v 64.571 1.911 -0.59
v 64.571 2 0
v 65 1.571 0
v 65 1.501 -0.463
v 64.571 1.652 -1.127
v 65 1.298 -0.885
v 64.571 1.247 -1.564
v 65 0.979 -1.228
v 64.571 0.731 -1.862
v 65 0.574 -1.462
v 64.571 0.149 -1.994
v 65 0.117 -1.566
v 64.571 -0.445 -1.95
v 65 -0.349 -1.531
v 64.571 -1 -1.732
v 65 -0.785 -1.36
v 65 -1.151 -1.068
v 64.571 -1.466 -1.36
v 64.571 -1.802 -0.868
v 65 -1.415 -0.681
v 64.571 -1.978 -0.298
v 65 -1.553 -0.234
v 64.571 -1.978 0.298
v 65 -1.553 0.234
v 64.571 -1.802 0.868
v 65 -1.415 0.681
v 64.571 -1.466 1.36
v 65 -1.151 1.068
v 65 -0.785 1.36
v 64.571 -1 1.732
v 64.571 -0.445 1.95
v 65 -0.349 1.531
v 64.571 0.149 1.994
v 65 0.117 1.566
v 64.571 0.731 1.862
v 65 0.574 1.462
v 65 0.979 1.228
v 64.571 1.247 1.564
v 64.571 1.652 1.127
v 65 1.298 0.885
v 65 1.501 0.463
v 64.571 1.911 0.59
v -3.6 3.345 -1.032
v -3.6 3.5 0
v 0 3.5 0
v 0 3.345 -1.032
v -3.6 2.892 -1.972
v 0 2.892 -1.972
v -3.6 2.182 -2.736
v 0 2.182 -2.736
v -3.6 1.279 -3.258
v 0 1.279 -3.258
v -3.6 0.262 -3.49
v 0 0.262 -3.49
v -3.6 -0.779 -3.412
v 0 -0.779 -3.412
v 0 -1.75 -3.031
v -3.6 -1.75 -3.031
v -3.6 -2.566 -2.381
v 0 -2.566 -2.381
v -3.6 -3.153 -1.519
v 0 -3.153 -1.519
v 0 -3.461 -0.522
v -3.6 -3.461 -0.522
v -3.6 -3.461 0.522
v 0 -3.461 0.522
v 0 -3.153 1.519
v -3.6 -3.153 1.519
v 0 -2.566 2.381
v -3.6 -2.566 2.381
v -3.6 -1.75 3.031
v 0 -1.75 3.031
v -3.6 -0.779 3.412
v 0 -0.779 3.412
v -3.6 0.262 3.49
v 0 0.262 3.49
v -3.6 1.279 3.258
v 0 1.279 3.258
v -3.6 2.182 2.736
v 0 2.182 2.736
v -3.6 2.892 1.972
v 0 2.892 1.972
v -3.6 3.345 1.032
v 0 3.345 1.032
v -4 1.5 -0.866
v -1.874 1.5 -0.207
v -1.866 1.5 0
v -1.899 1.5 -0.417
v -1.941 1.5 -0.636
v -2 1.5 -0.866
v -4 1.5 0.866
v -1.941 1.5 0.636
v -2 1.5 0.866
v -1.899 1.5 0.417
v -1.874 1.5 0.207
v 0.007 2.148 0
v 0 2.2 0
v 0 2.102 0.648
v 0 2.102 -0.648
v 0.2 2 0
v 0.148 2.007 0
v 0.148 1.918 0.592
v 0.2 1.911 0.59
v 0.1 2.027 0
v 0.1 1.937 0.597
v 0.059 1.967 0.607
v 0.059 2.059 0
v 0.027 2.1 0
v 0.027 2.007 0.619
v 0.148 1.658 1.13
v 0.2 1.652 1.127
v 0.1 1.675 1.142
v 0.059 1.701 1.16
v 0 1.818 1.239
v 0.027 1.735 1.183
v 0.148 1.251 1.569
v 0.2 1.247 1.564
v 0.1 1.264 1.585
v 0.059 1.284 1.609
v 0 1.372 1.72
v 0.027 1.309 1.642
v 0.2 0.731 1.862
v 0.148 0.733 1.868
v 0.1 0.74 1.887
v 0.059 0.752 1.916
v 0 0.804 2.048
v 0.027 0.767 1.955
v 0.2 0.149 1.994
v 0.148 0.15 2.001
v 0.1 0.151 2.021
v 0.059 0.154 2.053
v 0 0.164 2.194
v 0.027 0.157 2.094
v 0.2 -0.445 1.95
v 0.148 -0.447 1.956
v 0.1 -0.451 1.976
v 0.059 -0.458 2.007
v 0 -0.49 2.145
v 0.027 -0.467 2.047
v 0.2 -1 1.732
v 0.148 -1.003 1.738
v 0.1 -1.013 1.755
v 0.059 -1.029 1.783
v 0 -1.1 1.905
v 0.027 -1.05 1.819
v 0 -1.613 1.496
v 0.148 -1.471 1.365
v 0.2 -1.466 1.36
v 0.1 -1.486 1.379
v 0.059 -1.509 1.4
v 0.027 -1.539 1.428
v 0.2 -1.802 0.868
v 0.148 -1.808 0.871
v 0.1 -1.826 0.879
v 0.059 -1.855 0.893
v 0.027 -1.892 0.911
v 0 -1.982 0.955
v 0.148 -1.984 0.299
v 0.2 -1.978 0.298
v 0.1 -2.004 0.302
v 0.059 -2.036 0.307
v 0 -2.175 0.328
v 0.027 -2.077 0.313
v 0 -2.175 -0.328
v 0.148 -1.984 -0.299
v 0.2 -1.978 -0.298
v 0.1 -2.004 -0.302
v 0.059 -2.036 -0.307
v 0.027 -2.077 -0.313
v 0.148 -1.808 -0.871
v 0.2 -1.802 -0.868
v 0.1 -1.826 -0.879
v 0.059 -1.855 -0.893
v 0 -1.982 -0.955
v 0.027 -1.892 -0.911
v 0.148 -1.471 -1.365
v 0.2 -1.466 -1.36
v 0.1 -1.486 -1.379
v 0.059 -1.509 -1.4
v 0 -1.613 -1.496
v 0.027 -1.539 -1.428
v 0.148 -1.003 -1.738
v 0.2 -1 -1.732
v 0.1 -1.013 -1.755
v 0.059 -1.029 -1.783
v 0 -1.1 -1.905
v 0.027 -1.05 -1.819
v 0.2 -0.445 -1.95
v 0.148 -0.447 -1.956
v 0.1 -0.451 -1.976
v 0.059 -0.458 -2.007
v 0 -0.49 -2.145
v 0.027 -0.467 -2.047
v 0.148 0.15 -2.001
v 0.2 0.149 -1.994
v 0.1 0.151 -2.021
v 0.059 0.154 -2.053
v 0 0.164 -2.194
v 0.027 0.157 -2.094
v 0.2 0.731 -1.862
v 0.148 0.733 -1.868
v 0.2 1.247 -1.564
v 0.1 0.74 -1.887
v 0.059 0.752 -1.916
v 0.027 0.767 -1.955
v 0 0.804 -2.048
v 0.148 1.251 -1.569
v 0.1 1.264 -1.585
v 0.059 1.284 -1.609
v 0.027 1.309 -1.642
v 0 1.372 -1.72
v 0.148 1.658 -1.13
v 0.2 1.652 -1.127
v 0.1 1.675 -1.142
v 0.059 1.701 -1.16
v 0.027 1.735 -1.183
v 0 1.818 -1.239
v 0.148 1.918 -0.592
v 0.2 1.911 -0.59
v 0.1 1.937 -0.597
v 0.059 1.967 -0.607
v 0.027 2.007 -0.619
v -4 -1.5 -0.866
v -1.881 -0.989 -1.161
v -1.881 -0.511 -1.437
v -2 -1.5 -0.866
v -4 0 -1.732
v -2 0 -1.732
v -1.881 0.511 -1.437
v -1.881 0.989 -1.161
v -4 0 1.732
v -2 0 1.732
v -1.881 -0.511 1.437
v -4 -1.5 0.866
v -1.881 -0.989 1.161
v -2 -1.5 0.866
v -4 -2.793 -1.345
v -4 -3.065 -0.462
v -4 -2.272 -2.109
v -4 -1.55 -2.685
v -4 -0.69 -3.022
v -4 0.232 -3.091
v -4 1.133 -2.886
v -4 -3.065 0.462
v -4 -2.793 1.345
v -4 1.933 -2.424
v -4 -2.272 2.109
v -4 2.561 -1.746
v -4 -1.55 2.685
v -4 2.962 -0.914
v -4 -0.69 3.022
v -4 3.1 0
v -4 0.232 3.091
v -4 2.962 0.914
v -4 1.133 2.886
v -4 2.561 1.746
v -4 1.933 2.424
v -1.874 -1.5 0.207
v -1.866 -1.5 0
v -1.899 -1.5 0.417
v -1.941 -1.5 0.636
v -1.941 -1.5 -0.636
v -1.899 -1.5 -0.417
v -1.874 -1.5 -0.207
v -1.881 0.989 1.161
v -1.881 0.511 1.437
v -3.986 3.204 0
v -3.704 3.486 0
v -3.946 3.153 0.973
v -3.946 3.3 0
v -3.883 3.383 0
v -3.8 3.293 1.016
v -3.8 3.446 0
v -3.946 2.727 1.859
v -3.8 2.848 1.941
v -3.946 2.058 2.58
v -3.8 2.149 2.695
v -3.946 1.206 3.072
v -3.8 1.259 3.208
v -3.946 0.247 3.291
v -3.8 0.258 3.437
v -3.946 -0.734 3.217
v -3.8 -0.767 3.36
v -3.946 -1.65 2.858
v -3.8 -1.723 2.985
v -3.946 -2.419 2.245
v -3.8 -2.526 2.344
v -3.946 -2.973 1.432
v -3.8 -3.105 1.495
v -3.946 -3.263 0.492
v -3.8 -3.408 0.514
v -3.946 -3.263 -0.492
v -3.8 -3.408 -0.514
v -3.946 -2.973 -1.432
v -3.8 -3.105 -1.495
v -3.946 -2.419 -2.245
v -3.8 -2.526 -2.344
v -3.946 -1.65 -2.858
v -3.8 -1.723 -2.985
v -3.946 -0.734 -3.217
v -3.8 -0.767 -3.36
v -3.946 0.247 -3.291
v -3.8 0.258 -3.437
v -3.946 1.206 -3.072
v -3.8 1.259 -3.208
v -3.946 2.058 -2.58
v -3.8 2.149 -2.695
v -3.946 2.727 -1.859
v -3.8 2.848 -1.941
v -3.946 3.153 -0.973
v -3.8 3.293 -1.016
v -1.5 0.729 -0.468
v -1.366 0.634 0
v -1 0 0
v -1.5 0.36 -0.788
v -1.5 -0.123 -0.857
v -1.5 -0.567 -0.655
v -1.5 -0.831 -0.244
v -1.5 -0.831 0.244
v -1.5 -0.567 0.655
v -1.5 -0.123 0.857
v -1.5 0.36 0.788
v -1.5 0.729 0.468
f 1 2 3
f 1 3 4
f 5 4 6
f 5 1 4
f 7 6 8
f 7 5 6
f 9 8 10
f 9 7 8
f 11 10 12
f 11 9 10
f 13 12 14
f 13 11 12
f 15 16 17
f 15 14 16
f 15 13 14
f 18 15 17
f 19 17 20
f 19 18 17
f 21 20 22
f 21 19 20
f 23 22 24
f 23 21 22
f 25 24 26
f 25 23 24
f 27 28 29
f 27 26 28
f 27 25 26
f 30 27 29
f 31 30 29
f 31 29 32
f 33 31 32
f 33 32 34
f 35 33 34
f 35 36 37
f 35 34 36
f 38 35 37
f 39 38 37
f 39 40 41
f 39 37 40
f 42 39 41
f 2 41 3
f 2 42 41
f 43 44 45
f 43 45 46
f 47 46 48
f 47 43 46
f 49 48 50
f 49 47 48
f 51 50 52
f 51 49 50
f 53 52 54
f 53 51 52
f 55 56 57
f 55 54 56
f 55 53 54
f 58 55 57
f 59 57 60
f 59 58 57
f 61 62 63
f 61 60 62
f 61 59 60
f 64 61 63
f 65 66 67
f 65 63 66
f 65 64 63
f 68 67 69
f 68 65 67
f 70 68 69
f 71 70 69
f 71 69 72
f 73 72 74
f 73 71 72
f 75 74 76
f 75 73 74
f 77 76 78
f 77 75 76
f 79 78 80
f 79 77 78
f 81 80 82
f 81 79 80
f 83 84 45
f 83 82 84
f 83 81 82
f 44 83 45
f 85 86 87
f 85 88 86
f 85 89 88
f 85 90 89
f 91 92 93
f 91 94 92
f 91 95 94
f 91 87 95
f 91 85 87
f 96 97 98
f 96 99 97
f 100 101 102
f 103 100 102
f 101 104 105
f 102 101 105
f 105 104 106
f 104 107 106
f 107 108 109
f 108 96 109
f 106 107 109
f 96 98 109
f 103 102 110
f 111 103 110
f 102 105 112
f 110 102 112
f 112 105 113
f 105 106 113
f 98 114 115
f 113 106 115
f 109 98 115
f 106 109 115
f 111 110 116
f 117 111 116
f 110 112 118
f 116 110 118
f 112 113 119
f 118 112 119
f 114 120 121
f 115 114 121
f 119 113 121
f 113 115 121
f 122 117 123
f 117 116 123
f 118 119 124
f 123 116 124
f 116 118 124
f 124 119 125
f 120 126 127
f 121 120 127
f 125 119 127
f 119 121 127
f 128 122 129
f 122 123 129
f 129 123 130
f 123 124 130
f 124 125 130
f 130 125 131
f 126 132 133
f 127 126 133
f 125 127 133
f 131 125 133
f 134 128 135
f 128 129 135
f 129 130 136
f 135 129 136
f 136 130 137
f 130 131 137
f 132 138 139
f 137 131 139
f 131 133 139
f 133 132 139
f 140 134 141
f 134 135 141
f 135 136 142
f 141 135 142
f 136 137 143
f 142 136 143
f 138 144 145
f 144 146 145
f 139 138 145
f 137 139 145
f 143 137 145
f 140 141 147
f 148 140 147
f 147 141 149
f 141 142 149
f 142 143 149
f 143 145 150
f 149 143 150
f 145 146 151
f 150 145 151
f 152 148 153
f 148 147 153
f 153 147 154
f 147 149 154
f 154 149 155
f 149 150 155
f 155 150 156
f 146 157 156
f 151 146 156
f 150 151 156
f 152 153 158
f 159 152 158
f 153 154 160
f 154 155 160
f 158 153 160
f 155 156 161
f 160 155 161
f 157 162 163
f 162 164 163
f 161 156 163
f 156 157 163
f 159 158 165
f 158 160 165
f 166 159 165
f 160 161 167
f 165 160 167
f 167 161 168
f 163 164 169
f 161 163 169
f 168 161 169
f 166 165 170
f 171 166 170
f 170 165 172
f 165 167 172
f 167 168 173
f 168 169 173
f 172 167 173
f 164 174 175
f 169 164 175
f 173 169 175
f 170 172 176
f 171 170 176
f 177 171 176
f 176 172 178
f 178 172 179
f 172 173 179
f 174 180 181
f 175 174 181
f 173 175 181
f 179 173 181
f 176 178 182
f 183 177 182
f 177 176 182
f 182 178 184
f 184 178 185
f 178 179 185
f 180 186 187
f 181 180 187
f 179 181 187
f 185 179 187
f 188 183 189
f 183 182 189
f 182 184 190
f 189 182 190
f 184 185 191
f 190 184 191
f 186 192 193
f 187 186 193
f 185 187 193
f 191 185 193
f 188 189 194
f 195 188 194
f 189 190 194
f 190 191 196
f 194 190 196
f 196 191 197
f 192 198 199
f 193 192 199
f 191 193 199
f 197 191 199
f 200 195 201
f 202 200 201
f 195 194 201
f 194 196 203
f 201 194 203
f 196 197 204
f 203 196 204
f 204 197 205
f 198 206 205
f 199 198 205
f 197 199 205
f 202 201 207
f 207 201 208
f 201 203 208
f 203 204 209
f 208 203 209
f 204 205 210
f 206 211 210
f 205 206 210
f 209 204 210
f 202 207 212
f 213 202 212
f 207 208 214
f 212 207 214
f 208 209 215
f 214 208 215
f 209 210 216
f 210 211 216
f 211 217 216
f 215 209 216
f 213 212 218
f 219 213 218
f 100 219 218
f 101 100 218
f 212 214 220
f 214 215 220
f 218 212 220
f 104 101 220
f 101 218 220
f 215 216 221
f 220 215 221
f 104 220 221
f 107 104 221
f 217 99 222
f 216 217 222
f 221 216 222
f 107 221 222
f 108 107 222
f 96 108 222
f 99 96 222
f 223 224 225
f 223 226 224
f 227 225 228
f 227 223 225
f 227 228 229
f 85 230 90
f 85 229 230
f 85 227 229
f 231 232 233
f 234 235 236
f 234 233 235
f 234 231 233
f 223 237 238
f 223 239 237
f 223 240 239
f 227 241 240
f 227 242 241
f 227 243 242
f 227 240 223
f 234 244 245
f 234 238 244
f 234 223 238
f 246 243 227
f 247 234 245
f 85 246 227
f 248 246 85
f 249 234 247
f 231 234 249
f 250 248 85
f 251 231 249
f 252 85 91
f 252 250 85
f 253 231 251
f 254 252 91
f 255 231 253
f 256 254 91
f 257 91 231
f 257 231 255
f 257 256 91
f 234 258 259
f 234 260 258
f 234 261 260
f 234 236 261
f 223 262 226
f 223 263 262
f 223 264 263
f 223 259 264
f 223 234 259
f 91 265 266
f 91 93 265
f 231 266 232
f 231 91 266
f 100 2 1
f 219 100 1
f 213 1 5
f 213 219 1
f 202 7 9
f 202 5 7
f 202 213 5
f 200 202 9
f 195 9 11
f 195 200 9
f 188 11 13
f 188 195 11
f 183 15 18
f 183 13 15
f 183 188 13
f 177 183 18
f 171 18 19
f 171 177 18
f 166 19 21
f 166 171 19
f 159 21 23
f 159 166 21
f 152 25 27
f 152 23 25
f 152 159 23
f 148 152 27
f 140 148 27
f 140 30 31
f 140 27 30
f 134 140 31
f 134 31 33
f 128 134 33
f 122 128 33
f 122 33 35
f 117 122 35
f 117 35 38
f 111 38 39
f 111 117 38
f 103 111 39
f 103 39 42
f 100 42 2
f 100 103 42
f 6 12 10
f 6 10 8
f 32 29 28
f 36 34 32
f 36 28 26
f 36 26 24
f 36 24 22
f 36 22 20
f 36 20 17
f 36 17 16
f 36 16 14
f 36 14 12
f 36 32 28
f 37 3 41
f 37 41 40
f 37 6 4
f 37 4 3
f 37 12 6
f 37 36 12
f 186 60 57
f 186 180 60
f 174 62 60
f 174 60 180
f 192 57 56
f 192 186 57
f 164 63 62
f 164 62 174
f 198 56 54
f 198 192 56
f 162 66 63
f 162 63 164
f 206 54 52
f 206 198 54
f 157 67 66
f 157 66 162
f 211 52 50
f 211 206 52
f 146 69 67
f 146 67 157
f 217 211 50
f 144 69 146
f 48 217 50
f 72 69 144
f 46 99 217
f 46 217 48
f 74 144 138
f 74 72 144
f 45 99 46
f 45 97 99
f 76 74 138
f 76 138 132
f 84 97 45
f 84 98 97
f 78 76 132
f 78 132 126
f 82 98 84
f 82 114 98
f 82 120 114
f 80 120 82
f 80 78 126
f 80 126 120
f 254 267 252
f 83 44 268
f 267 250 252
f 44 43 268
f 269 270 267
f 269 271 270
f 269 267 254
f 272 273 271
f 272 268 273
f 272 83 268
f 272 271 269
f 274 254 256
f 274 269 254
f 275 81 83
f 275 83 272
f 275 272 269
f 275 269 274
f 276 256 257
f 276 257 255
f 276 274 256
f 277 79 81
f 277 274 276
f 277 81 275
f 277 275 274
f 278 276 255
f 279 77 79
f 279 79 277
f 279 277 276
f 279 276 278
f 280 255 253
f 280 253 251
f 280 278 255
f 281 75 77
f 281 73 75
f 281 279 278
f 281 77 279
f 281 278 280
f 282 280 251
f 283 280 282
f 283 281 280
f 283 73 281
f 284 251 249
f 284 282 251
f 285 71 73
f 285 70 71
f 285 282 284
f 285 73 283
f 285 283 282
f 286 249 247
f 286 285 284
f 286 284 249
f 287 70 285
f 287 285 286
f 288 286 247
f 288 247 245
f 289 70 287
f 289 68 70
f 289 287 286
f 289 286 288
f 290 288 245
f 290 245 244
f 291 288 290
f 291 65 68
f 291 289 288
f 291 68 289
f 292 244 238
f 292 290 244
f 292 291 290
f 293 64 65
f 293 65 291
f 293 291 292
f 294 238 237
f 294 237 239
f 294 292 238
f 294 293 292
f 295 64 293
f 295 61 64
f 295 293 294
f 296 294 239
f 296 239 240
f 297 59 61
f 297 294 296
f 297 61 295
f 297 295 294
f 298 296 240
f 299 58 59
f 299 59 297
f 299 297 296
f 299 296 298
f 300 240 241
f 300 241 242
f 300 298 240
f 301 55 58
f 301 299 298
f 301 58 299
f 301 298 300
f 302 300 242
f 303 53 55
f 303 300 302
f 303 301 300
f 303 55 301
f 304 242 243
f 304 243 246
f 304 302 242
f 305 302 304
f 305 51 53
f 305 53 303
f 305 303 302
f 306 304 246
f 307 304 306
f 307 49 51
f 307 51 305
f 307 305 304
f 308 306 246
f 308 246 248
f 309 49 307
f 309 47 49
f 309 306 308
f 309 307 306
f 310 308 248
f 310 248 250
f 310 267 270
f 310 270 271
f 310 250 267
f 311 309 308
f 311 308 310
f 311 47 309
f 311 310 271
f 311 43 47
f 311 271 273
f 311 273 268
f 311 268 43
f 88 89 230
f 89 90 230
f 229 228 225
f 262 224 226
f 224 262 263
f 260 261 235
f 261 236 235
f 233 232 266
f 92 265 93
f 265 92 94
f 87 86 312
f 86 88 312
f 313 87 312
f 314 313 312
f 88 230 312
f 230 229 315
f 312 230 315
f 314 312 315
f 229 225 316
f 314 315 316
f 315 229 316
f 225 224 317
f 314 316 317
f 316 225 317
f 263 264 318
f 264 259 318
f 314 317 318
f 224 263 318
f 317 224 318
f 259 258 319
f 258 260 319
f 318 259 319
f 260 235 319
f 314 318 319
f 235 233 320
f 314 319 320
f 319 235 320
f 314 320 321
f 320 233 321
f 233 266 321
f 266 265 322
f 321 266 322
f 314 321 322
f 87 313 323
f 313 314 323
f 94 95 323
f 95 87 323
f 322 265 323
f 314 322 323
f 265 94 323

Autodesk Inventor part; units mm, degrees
ref_plane "YZ Plane" through (0, 0, 0) normal (1, 0, 0) x (0, 1, 0)
ref_plane "XZ Plane" through (0, 0, 0) normal (0, 1, 0) x (-1, 0, 0)
sketch "Sketch1" plane through (0, 0, 0) normal (0, 0, 1) x (1, 0, 0)
  line L0 (-1, 0) -> (65, 0)
  line L1 (65, 0) -> (65, 2)
  line L2 (65, 2) -> (45, 2)
  line L3 (45, 2) -> (44.5706, 2)
  line L4 (44.5706, 2) -> (0, 2)
  line L5 (0, 2) -> (0, 3.5)
  line L6 (0, 3.5) -> (-4, 3.5)
  line L7 (-4, 3.5) -> (-4, 1.7321)
  line L8 (-4, 1.7321) -> (-2, 1.7321)
  line L9 (-2, 1.7321) -> (-1, 0)
  line L10 (-17.8, 0) -> (78.8, 0) projected
  line L11 (0, -0.7) -> (0, 4.2) projected
  line L12 (45, 2) -> (0, 2) construction
  dimension "d0" = 20
  dimension "d1" = 0.4294
  dimension "d2" = 4
  dimension "d3" = 2
  dimension "d4" = 60
  dimension "d5" = 4
  dimension "d6" = 4
  dimension "d7" = 3.4641
  dimension "d8" = 7
  dimension "d19" = 65
revolve "Body" add sketch "Sketch1" angle 360 about axis through (-1, 0, 0) along (1, 0, 0)
sketch "Sketch2" plane through (-4, 0, 0) normal (-1, 0, 0) x (0, 0, 1)
  circle A0 centre (0, 0) radius 1.7321 projected
  line L0 (0, -4.9) -> (0, 4.9) projected
  line L1 (-4.9, 0) -> (4.9, 0) projected
  line L2 (1.7321, 0) -> (0.866, -1.5)
  line L3 (0.866, -1.5) -> (-0.866, -1.5)
  line L4 (-0.866, -1.5) -> (-1.7321, 0)
  line L5 (-1.7321, 0) -> (-0.866, 1.5)
  line L6 (-0.866, 1.5) -> (0.866, 1.5)
  line L7 (0.866, 1.5) -> (1.7321, 0)
extrude "Slot" add sketch "Sketch2" against normal up to next contours L7 A0 | A0 L2 | L6 L0 A0 | A0 L0 L3 | L0 L6 A0 | A0 L3 L0 | L4 A0 | A0 L5
fillet "Fillet2" radius 0.4 1 edges at (-4, -3.5, 0)
thread "Thread" size "M4x0.7" class "6g" standard "ISO Metric profile" length 20
chamfer "Chamfer1" distance 0.4294 distance2 0.4294 1 edges at (65, -2, 0) measured on face at (65, -0.527, -0.8312)
fillet "Fillet1" radius 0.2 1 edges at (0, -2, 0)
ref_plane "Work Plane1" through (30, 0, 0) normal (0, -0.5, 0.866) x (1, 0, 0)
equation "\"d0\" = GEL"
equation "\"d1\" = GAL"
equation "\"d2\" = KOH"
equation "\"d3\" = INTI"
equation "\"d5\" = GD"
equation "\"d6\" = BDM"
equation "\"d7\" = 1.1547 * SW"
equation "\"d8\" = KOD"
equation "\"d19\" = NLG"
equation "\"d16\" = RR"
equation "\"d12\" = GEL"
equation "\"d14\" = -0.5 * SPD + 0.5 * GD"
equation "\"d15\" = GUL"
equation "\"d29\" = R"
equation "\"GD\" = NND"
equation "\"NLG\" = 65"
equation "\"GEL\" = 20"
equation "\"KOD\" = 7"
equation "\"KOH\" = 4"
equation "\"INTI\" = 2"
equation "\"GAL\" = 0.61345 * PTC"
equation "\"GUL\" = 0.61345 * PTC"
equation "\"BDM\" = NND"
equation "\"SW\" = 3"
equation "\"RR\" = 0.4"
equation "\"SPD\" = 3.14117"
equation "\"d28\" = R"
equation "\"R\" = 0.2"
equation "\"TOA\" = 30deg"
equation "\"THREADDIA\" = 4"
equation "\"KOD1\" = KOD"
equation "\"PTC\" = 0.7"
equation "\"NND\" = 4"
equation "\"E0\" = 1.155 * SW"
equation "\"GD1\" = THREADDIA - 1.2269 * PTC"
properties part number "ANSI B18.3.1M - M4x0.7 x 65, BSHCSM" material "Steel, Mild"
